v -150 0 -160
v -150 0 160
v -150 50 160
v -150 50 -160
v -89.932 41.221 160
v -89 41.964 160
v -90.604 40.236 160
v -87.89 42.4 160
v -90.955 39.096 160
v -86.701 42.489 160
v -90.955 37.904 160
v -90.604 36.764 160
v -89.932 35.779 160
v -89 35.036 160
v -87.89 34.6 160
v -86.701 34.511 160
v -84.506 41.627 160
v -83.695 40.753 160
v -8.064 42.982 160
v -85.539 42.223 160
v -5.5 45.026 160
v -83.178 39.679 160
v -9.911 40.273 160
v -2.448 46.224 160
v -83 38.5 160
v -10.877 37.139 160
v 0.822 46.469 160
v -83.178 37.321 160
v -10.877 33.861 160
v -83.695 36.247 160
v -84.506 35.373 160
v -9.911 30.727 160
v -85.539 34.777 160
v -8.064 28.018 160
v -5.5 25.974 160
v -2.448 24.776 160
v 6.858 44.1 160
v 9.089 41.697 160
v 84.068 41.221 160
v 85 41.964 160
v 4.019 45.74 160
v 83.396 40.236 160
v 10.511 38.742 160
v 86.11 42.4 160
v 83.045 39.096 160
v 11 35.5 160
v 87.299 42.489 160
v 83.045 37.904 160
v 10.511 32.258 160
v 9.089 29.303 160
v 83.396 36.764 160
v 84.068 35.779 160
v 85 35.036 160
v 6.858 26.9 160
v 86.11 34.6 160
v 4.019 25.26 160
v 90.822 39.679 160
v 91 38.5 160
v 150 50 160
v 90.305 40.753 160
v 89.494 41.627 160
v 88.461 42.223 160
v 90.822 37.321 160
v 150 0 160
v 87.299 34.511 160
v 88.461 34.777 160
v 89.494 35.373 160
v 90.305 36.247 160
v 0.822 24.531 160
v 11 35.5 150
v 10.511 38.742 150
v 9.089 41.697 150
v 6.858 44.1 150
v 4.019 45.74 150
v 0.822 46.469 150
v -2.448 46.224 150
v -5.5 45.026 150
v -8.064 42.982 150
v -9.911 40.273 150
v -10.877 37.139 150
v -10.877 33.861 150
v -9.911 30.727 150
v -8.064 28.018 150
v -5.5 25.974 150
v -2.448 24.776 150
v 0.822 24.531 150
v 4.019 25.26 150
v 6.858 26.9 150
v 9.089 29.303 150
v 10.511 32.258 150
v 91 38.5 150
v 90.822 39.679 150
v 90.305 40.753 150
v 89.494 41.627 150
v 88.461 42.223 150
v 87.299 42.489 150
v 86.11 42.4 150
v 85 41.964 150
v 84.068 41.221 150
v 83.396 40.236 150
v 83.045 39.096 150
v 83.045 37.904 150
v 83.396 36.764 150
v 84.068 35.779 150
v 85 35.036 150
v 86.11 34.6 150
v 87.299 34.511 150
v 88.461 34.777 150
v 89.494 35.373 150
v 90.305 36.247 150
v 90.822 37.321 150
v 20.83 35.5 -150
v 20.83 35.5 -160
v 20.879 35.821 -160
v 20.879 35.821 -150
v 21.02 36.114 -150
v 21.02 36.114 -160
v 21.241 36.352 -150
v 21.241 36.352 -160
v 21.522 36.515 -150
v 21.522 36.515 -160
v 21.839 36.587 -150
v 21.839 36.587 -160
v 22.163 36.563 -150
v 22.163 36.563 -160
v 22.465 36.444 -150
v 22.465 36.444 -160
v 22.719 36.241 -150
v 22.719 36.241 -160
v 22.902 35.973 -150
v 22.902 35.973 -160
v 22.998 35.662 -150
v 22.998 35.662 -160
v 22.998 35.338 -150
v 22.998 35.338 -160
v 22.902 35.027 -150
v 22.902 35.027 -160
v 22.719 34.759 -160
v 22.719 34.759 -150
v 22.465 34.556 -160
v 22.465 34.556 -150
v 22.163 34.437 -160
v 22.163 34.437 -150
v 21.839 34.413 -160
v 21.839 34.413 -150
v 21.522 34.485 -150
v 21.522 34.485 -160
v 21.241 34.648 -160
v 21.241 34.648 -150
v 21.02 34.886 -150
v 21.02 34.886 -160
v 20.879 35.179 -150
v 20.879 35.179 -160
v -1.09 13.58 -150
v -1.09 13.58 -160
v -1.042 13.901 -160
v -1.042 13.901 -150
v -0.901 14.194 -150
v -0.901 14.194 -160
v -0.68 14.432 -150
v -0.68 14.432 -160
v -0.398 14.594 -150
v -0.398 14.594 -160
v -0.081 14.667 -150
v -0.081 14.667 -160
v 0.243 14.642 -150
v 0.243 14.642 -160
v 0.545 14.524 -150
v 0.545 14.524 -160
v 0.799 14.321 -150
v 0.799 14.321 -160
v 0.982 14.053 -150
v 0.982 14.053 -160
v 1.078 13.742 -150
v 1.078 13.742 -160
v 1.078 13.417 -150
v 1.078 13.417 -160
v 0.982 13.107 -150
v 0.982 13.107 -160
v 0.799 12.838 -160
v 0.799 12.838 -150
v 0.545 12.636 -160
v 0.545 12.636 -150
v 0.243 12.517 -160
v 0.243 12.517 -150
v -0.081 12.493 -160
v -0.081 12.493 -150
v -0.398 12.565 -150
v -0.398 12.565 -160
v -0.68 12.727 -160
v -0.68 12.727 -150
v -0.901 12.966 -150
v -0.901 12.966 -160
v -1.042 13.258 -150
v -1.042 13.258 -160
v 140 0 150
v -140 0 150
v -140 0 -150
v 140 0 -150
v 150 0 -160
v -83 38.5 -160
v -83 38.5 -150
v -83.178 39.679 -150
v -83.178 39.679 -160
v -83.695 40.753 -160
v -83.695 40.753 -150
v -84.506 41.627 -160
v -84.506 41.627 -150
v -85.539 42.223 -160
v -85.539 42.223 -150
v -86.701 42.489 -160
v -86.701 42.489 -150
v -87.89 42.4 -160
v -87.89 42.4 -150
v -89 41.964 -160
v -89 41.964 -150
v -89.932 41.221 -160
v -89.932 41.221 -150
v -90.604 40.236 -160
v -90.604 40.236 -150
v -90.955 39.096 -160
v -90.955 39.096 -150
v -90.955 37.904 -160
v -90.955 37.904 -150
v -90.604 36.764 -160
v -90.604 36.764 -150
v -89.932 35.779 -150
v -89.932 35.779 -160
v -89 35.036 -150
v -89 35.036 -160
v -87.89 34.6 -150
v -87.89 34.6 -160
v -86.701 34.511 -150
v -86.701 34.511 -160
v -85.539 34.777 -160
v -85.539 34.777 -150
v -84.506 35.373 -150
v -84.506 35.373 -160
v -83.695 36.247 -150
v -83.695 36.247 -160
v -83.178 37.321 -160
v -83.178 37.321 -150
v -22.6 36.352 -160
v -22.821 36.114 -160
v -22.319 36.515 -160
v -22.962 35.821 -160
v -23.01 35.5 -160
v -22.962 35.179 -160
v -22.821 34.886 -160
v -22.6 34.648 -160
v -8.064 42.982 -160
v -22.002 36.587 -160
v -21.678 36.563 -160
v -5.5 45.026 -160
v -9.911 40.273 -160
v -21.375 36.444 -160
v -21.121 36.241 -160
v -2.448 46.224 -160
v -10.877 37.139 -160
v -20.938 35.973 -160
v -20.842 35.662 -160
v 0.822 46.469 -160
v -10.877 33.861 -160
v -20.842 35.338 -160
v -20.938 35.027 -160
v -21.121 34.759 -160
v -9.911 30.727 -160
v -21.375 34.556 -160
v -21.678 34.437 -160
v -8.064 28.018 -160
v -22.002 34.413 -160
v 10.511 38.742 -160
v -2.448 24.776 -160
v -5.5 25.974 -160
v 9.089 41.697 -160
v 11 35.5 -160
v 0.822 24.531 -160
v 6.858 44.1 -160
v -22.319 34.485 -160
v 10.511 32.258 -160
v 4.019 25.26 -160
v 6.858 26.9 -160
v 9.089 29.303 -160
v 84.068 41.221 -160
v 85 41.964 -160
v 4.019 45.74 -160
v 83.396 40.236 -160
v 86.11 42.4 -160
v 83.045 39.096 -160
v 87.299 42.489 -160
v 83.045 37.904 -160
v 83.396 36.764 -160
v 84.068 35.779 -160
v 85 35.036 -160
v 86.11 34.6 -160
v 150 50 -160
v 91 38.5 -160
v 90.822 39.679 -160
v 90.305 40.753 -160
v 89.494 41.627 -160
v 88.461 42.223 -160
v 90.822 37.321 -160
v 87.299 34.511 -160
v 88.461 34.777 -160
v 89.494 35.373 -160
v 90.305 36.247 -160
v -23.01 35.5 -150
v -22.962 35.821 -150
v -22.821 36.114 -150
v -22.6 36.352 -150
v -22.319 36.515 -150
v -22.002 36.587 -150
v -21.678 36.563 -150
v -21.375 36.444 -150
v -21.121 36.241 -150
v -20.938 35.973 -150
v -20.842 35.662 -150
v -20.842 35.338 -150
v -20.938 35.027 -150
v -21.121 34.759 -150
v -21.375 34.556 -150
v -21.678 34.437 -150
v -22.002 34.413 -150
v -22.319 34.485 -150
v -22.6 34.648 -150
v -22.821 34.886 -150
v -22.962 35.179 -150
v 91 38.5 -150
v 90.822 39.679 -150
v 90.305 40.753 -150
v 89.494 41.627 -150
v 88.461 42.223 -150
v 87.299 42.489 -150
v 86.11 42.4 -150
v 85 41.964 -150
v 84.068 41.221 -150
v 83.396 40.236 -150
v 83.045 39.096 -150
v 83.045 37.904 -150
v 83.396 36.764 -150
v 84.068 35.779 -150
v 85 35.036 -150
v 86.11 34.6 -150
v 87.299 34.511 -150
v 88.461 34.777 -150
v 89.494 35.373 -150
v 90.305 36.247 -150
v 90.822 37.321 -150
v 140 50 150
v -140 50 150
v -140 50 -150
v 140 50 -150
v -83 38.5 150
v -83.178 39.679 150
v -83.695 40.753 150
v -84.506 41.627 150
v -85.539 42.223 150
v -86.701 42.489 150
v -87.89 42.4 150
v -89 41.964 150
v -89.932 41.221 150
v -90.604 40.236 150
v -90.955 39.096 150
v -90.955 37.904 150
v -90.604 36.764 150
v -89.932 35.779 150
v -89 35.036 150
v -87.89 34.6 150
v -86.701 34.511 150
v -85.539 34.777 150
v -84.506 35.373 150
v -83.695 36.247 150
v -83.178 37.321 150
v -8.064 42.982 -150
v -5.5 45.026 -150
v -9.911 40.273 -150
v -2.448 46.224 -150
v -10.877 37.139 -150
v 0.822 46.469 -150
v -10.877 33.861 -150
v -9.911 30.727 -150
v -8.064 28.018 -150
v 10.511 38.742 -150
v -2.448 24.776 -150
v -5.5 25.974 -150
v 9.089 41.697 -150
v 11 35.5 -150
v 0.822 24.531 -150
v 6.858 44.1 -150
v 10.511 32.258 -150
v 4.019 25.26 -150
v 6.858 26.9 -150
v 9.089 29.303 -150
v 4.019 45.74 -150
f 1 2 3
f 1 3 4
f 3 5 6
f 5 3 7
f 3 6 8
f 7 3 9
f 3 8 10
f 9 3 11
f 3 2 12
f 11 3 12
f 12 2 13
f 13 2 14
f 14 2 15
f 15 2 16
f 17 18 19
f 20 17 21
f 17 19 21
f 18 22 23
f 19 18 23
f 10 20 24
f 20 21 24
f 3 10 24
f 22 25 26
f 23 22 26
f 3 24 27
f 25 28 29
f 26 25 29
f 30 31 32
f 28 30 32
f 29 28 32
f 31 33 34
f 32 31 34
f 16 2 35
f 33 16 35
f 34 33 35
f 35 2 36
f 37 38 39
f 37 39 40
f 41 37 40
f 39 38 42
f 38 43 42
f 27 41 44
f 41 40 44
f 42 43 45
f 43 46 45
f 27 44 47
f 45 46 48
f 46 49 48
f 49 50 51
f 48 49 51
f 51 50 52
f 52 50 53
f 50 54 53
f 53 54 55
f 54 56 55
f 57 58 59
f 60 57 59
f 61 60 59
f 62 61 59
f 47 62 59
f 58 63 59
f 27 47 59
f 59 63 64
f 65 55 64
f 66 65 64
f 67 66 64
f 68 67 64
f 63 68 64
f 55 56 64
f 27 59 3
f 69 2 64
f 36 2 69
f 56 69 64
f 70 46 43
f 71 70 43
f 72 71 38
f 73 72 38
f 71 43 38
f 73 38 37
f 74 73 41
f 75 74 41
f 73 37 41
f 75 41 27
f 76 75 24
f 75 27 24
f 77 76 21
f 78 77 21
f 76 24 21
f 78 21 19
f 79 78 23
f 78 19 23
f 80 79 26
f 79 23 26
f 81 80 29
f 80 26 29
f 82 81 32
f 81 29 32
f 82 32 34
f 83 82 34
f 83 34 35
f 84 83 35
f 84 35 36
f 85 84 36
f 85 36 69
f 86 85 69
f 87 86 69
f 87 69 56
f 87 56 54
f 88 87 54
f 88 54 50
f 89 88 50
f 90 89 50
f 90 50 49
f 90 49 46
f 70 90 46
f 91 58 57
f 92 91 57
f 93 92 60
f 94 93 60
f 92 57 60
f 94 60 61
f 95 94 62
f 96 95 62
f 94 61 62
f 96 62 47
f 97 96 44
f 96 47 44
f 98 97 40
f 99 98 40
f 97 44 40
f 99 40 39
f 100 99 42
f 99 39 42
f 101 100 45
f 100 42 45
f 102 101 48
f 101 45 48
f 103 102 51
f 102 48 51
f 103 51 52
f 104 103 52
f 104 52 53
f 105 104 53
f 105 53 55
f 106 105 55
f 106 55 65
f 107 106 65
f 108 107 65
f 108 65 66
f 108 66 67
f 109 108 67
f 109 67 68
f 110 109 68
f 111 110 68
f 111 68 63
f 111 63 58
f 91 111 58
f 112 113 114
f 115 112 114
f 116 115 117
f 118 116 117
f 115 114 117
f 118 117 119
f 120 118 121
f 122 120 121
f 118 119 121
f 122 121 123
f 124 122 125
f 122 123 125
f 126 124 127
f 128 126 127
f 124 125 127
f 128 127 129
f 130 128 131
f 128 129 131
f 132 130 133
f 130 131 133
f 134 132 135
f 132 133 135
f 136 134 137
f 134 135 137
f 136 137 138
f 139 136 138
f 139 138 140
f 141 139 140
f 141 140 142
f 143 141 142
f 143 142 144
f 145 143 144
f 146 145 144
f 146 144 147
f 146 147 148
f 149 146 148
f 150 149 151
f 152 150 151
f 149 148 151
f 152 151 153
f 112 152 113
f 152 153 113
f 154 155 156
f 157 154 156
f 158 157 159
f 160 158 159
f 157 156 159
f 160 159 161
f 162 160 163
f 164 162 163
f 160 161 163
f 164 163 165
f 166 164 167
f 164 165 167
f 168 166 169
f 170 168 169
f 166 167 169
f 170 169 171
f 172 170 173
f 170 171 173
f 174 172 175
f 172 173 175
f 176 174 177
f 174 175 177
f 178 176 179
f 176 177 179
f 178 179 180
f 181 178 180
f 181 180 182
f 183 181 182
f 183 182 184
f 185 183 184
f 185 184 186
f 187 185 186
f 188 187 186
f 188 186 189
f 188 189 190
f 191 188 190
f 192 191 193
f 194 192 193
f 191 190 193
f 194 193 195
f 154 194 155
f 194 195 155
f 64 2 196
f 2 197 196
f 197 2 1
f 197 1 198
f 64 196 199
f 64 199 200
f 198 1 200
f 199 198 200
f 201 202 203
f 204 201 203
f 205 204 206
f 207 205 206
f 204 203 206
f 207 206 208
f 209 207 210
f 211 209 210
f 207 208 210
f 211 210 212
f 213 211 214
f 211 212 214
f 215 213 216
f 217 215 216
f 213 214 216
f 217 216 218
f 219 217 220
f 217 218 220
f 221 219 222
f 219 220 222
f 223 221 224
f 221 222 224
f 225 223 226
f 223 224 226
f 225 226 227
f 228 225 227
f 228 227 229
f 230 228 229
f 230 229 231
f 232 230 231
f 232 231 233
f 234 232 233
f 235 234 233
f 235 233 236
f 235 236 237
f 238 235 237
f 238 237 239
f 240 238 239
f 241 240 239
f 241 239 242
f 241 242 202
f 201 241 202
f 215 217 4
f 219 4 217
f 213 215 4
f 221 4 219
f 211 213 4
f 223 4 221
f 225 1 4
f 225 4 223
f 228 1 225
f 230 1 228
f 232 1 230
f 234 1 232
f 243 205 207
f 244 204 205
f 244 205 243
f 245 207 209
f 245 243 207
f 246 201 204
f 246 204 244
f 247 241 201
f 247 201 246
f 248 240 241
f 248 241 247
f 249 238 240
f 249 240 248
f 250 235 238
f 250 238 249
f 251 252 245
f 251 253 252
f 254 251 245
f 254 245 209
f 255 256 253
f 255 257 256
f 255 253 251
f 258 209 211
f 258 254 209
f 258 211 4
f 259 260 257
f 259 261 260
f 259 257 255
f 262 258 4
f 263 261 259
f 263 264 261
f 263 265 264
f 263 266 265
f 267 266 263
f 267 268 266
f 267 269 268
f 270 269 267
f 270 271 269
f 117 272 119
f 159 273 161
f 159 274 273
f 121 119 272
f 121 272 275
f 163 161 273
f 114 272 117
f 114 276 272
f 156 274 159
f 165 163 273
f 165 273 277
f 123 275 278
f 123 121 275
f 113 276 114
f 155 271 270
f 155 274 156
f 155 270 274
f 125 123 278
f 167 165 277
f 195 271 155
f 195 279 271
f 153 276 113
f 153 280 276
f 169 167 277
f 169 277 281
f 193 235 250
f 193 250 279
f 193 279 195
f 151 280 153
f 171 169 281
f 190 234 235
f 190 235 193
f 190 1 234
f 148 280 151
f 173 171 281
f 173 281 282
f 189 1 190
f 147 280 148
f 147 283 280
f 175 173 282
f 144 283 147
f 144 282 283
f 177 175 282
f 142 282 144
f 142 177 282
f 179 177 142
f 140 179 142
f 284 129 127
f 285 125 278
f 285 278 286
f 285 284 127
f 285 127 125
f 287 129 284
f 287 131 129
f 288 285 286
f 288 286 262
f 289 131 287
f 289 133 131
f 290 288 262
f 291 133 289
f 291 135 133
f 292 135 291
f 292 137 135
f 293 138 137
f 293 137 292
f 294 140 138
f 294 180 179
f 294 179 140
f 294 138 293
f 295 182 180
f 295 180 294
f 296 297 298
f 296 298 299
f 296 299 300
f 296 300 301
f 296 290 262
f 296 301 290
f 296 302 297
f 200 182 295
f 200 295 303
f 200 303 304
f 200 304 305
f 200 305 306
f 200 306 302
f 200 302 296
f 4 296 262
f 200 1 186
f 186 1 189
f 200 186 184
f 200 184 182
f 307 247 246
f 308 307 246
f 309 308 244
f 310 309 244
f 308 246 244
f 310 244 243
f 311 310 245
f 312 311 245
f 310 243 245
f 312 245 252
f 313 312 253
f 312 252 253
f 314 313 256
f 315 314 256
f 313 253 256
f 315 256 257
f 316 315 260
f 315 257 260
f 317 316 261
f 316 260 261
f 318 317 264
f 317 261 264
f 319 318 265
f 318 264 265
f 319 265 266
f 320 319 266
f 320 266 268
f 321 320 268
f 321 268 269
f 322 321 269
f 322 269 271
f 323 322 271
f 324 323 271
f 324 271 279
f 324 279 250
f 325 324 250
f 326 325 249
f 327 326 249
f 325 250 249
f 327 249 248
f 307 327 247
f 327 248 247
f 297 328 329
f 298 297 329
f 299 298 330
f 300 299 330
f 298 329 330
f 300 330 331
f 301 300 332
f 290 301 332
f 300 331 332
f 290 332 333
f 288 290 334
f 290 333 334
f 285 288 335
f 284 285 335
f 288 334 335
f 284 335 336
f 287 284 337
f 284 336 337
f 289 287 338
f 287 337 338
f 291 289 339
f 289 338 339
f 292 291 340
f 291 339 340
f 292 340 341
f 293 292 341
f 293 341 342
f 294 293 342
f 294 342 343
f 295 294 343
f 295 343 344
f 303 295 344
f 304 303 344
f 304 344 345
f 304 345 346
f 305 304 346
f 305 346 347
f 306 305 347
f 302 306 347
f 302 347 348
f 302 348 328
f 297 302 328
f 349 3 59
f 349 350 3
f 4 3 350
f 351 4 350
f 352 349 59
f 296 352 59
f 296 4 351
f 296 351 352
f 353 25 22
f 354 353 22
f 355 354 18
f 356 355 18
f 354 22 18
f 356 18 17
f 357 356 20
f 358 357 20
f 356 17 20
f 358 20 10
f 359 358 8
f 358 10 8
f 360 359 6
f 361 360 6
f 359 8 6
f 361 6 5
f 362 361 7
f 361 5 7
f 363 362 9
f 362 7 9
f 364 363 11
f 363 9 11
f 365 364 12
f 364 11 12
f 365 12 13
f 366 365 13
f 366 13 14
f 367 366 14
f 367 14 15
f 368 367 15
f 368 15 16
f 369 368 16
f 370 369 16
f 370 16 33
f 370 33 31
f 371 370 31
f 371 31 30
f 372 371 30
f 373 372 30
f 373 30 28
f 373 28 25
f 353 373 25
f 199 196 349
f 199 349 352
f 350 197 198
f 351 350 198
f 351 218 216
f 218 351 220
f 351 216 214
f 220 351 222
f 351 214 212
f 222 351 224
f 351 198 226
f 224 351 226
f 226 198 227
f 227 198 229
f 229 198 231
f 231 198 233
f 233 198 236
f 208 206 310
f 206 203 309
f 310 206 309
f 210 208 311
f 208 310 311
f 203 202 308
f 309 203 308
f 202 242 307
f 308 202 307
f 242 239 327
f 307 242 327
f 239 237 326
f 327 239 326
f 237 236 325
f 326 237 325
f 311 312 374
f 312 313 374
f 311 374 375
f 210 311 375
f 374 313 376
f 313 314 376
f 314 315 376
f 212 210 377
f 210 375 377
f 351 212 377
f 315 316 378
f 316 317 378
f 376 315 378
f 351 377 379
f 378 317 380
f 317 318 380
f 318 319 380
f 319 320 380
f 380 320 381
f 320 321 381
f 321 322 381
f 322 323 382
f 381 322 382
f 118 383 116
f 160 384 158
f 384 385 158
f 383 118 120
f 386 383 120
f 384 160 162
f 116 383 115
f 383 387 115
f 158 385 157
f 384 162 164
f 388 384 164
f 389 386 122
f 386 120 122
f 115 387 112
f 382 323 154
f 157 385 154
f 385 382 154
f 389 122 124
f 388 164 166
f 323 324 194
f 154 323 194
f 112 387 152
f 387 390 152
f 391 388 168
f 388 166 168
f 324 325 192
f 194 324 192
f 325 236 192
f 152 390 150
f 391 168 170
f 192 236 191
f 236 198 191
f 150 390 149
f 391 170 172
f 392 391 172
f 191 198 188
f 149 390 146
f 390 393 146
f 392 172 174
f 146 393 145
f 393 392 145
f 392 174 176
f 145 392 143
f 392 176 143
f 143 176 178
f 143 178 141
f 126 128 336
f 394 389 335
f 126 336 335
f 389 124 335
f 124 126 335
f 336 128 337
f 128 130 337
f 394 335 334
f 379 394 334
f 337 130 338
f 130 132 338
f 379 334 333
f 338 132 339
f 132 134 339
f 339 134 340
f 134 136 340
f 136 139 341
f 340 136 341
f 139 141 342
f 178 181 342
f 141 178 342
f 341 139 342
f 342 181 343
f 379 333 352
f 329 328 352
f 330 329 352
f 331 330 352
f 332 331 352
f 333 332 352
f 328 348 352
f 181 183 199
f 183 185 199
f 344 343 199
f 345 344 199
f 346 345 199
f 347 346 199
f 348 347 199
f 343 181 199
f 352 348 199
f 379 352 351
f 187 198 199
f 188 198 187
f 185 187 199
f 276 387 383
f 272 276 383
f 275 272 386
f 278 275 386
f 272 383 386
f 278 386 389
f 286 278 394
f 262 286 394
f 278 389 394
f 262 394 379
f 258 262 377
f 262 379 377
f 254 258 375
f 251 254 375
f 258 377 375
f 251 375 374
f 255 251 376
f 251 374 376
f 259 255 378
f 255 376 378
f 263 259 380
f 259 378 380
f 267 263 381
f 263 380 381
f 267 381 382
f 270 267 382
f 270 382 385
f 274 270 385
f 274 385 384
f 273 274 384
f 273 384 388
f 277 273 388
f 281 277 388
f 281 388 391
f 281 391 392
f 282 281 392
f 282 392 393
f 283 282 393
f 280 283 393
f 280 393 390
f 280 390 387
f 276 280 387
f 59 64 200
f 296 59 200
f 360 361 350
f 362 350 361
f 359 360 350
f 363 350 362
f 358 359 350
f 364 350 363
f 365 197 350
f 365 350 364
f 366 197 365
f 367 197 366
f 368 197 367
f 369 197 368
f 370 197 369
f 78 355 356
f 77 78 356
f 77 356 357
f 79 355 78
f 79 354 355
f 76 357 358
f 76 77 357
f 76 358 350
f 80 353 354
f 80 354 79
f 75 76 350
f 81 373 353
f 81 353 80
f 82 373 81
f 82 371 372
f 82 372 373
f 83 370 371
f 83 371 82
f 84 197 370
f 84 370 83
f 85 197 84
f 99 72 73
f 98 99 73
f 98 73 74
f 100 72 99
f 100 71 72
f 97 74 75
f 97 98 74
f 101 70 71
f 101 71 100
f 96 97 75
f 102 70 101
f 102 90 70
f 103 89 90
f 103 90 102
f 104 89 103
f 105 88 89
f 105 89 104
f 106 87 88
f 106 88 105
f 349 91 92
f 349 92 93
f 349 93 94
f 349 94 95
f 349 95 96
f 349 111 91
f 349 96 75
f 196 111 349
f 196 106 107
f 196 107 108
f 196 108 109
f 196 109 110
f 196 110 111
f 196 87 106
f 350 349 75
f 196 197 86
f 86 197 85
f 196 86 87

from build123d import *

# Parameters (mm, degrees)
CROQUIS1_W              = 300
CROQUIS1_H              = 320
CROQUIS1_W_2            = 280
CROQUIS1_H_2            = 300
SALIENTE_EXTRUIR1_DEPTH = 50
CROQUIS2_R              = 4
CROQUIS2_R_2            = 11
CORTAR_EXTRUIR1_DEPTH   = 321
SKETCH1_R               = 1.09
CUT_EXTRUDE1_DEPTH      = 10


with BuildPart() as part:
    # Croquis1 → Saliente-Extruir1 (new body)
    with BuildSketch(Plane(origin=(0, 0, 0), x_dir=(1, 0, 0), z_dir=(0, 1, 0))):
        Rectangle(CROQUIS1_W, CROQUIS1_H)
        Rectangle(CROQUIS1_W_2, CROQUIS1_H_2, mode=Mode.SUBTRACT)
    extrude(amount=SALIENTE_EXTRUIR1_DEPTH)

    # Croquis2 → Cortar-Extruir1 (cut, through all)
    with BuildSketch(Plane.XY.offset(160)):
        with Locations((-87, 38.5)):
            Circle(CROQUIS2_R)
        with Locations((0, 35.5)):
            Circle(CROQUIS2_R_2)
        with Locations((87, 38.5)):
            Circle(CROQUIS2_R)
    extrude(amount=-CORTAR_EXTRUIR1_DEPTH, mode=Mode.SUBTRACT)

    # Sketch1 → Cut-Extrude1 (cut)
    with BuildSketch(Plane(origin=(0, 0, -160), x_dir=(-1, 0, 0), z_dir=(0, 0, -1))):
        with Locations((0, 13.579689783)):
            Circle(SKETCH1_R)
        with Locations((-21.920310217, 35.5)):
            Circle(SKETCH1_R)
        with Locations((21.920310217, 35.5)):
            Circle(SKETCH1_R)
    extrude(amount=-CUT_EXTRUDE1_DEPTH, mode=Mode.SUBTRACT)


solid = part.part
